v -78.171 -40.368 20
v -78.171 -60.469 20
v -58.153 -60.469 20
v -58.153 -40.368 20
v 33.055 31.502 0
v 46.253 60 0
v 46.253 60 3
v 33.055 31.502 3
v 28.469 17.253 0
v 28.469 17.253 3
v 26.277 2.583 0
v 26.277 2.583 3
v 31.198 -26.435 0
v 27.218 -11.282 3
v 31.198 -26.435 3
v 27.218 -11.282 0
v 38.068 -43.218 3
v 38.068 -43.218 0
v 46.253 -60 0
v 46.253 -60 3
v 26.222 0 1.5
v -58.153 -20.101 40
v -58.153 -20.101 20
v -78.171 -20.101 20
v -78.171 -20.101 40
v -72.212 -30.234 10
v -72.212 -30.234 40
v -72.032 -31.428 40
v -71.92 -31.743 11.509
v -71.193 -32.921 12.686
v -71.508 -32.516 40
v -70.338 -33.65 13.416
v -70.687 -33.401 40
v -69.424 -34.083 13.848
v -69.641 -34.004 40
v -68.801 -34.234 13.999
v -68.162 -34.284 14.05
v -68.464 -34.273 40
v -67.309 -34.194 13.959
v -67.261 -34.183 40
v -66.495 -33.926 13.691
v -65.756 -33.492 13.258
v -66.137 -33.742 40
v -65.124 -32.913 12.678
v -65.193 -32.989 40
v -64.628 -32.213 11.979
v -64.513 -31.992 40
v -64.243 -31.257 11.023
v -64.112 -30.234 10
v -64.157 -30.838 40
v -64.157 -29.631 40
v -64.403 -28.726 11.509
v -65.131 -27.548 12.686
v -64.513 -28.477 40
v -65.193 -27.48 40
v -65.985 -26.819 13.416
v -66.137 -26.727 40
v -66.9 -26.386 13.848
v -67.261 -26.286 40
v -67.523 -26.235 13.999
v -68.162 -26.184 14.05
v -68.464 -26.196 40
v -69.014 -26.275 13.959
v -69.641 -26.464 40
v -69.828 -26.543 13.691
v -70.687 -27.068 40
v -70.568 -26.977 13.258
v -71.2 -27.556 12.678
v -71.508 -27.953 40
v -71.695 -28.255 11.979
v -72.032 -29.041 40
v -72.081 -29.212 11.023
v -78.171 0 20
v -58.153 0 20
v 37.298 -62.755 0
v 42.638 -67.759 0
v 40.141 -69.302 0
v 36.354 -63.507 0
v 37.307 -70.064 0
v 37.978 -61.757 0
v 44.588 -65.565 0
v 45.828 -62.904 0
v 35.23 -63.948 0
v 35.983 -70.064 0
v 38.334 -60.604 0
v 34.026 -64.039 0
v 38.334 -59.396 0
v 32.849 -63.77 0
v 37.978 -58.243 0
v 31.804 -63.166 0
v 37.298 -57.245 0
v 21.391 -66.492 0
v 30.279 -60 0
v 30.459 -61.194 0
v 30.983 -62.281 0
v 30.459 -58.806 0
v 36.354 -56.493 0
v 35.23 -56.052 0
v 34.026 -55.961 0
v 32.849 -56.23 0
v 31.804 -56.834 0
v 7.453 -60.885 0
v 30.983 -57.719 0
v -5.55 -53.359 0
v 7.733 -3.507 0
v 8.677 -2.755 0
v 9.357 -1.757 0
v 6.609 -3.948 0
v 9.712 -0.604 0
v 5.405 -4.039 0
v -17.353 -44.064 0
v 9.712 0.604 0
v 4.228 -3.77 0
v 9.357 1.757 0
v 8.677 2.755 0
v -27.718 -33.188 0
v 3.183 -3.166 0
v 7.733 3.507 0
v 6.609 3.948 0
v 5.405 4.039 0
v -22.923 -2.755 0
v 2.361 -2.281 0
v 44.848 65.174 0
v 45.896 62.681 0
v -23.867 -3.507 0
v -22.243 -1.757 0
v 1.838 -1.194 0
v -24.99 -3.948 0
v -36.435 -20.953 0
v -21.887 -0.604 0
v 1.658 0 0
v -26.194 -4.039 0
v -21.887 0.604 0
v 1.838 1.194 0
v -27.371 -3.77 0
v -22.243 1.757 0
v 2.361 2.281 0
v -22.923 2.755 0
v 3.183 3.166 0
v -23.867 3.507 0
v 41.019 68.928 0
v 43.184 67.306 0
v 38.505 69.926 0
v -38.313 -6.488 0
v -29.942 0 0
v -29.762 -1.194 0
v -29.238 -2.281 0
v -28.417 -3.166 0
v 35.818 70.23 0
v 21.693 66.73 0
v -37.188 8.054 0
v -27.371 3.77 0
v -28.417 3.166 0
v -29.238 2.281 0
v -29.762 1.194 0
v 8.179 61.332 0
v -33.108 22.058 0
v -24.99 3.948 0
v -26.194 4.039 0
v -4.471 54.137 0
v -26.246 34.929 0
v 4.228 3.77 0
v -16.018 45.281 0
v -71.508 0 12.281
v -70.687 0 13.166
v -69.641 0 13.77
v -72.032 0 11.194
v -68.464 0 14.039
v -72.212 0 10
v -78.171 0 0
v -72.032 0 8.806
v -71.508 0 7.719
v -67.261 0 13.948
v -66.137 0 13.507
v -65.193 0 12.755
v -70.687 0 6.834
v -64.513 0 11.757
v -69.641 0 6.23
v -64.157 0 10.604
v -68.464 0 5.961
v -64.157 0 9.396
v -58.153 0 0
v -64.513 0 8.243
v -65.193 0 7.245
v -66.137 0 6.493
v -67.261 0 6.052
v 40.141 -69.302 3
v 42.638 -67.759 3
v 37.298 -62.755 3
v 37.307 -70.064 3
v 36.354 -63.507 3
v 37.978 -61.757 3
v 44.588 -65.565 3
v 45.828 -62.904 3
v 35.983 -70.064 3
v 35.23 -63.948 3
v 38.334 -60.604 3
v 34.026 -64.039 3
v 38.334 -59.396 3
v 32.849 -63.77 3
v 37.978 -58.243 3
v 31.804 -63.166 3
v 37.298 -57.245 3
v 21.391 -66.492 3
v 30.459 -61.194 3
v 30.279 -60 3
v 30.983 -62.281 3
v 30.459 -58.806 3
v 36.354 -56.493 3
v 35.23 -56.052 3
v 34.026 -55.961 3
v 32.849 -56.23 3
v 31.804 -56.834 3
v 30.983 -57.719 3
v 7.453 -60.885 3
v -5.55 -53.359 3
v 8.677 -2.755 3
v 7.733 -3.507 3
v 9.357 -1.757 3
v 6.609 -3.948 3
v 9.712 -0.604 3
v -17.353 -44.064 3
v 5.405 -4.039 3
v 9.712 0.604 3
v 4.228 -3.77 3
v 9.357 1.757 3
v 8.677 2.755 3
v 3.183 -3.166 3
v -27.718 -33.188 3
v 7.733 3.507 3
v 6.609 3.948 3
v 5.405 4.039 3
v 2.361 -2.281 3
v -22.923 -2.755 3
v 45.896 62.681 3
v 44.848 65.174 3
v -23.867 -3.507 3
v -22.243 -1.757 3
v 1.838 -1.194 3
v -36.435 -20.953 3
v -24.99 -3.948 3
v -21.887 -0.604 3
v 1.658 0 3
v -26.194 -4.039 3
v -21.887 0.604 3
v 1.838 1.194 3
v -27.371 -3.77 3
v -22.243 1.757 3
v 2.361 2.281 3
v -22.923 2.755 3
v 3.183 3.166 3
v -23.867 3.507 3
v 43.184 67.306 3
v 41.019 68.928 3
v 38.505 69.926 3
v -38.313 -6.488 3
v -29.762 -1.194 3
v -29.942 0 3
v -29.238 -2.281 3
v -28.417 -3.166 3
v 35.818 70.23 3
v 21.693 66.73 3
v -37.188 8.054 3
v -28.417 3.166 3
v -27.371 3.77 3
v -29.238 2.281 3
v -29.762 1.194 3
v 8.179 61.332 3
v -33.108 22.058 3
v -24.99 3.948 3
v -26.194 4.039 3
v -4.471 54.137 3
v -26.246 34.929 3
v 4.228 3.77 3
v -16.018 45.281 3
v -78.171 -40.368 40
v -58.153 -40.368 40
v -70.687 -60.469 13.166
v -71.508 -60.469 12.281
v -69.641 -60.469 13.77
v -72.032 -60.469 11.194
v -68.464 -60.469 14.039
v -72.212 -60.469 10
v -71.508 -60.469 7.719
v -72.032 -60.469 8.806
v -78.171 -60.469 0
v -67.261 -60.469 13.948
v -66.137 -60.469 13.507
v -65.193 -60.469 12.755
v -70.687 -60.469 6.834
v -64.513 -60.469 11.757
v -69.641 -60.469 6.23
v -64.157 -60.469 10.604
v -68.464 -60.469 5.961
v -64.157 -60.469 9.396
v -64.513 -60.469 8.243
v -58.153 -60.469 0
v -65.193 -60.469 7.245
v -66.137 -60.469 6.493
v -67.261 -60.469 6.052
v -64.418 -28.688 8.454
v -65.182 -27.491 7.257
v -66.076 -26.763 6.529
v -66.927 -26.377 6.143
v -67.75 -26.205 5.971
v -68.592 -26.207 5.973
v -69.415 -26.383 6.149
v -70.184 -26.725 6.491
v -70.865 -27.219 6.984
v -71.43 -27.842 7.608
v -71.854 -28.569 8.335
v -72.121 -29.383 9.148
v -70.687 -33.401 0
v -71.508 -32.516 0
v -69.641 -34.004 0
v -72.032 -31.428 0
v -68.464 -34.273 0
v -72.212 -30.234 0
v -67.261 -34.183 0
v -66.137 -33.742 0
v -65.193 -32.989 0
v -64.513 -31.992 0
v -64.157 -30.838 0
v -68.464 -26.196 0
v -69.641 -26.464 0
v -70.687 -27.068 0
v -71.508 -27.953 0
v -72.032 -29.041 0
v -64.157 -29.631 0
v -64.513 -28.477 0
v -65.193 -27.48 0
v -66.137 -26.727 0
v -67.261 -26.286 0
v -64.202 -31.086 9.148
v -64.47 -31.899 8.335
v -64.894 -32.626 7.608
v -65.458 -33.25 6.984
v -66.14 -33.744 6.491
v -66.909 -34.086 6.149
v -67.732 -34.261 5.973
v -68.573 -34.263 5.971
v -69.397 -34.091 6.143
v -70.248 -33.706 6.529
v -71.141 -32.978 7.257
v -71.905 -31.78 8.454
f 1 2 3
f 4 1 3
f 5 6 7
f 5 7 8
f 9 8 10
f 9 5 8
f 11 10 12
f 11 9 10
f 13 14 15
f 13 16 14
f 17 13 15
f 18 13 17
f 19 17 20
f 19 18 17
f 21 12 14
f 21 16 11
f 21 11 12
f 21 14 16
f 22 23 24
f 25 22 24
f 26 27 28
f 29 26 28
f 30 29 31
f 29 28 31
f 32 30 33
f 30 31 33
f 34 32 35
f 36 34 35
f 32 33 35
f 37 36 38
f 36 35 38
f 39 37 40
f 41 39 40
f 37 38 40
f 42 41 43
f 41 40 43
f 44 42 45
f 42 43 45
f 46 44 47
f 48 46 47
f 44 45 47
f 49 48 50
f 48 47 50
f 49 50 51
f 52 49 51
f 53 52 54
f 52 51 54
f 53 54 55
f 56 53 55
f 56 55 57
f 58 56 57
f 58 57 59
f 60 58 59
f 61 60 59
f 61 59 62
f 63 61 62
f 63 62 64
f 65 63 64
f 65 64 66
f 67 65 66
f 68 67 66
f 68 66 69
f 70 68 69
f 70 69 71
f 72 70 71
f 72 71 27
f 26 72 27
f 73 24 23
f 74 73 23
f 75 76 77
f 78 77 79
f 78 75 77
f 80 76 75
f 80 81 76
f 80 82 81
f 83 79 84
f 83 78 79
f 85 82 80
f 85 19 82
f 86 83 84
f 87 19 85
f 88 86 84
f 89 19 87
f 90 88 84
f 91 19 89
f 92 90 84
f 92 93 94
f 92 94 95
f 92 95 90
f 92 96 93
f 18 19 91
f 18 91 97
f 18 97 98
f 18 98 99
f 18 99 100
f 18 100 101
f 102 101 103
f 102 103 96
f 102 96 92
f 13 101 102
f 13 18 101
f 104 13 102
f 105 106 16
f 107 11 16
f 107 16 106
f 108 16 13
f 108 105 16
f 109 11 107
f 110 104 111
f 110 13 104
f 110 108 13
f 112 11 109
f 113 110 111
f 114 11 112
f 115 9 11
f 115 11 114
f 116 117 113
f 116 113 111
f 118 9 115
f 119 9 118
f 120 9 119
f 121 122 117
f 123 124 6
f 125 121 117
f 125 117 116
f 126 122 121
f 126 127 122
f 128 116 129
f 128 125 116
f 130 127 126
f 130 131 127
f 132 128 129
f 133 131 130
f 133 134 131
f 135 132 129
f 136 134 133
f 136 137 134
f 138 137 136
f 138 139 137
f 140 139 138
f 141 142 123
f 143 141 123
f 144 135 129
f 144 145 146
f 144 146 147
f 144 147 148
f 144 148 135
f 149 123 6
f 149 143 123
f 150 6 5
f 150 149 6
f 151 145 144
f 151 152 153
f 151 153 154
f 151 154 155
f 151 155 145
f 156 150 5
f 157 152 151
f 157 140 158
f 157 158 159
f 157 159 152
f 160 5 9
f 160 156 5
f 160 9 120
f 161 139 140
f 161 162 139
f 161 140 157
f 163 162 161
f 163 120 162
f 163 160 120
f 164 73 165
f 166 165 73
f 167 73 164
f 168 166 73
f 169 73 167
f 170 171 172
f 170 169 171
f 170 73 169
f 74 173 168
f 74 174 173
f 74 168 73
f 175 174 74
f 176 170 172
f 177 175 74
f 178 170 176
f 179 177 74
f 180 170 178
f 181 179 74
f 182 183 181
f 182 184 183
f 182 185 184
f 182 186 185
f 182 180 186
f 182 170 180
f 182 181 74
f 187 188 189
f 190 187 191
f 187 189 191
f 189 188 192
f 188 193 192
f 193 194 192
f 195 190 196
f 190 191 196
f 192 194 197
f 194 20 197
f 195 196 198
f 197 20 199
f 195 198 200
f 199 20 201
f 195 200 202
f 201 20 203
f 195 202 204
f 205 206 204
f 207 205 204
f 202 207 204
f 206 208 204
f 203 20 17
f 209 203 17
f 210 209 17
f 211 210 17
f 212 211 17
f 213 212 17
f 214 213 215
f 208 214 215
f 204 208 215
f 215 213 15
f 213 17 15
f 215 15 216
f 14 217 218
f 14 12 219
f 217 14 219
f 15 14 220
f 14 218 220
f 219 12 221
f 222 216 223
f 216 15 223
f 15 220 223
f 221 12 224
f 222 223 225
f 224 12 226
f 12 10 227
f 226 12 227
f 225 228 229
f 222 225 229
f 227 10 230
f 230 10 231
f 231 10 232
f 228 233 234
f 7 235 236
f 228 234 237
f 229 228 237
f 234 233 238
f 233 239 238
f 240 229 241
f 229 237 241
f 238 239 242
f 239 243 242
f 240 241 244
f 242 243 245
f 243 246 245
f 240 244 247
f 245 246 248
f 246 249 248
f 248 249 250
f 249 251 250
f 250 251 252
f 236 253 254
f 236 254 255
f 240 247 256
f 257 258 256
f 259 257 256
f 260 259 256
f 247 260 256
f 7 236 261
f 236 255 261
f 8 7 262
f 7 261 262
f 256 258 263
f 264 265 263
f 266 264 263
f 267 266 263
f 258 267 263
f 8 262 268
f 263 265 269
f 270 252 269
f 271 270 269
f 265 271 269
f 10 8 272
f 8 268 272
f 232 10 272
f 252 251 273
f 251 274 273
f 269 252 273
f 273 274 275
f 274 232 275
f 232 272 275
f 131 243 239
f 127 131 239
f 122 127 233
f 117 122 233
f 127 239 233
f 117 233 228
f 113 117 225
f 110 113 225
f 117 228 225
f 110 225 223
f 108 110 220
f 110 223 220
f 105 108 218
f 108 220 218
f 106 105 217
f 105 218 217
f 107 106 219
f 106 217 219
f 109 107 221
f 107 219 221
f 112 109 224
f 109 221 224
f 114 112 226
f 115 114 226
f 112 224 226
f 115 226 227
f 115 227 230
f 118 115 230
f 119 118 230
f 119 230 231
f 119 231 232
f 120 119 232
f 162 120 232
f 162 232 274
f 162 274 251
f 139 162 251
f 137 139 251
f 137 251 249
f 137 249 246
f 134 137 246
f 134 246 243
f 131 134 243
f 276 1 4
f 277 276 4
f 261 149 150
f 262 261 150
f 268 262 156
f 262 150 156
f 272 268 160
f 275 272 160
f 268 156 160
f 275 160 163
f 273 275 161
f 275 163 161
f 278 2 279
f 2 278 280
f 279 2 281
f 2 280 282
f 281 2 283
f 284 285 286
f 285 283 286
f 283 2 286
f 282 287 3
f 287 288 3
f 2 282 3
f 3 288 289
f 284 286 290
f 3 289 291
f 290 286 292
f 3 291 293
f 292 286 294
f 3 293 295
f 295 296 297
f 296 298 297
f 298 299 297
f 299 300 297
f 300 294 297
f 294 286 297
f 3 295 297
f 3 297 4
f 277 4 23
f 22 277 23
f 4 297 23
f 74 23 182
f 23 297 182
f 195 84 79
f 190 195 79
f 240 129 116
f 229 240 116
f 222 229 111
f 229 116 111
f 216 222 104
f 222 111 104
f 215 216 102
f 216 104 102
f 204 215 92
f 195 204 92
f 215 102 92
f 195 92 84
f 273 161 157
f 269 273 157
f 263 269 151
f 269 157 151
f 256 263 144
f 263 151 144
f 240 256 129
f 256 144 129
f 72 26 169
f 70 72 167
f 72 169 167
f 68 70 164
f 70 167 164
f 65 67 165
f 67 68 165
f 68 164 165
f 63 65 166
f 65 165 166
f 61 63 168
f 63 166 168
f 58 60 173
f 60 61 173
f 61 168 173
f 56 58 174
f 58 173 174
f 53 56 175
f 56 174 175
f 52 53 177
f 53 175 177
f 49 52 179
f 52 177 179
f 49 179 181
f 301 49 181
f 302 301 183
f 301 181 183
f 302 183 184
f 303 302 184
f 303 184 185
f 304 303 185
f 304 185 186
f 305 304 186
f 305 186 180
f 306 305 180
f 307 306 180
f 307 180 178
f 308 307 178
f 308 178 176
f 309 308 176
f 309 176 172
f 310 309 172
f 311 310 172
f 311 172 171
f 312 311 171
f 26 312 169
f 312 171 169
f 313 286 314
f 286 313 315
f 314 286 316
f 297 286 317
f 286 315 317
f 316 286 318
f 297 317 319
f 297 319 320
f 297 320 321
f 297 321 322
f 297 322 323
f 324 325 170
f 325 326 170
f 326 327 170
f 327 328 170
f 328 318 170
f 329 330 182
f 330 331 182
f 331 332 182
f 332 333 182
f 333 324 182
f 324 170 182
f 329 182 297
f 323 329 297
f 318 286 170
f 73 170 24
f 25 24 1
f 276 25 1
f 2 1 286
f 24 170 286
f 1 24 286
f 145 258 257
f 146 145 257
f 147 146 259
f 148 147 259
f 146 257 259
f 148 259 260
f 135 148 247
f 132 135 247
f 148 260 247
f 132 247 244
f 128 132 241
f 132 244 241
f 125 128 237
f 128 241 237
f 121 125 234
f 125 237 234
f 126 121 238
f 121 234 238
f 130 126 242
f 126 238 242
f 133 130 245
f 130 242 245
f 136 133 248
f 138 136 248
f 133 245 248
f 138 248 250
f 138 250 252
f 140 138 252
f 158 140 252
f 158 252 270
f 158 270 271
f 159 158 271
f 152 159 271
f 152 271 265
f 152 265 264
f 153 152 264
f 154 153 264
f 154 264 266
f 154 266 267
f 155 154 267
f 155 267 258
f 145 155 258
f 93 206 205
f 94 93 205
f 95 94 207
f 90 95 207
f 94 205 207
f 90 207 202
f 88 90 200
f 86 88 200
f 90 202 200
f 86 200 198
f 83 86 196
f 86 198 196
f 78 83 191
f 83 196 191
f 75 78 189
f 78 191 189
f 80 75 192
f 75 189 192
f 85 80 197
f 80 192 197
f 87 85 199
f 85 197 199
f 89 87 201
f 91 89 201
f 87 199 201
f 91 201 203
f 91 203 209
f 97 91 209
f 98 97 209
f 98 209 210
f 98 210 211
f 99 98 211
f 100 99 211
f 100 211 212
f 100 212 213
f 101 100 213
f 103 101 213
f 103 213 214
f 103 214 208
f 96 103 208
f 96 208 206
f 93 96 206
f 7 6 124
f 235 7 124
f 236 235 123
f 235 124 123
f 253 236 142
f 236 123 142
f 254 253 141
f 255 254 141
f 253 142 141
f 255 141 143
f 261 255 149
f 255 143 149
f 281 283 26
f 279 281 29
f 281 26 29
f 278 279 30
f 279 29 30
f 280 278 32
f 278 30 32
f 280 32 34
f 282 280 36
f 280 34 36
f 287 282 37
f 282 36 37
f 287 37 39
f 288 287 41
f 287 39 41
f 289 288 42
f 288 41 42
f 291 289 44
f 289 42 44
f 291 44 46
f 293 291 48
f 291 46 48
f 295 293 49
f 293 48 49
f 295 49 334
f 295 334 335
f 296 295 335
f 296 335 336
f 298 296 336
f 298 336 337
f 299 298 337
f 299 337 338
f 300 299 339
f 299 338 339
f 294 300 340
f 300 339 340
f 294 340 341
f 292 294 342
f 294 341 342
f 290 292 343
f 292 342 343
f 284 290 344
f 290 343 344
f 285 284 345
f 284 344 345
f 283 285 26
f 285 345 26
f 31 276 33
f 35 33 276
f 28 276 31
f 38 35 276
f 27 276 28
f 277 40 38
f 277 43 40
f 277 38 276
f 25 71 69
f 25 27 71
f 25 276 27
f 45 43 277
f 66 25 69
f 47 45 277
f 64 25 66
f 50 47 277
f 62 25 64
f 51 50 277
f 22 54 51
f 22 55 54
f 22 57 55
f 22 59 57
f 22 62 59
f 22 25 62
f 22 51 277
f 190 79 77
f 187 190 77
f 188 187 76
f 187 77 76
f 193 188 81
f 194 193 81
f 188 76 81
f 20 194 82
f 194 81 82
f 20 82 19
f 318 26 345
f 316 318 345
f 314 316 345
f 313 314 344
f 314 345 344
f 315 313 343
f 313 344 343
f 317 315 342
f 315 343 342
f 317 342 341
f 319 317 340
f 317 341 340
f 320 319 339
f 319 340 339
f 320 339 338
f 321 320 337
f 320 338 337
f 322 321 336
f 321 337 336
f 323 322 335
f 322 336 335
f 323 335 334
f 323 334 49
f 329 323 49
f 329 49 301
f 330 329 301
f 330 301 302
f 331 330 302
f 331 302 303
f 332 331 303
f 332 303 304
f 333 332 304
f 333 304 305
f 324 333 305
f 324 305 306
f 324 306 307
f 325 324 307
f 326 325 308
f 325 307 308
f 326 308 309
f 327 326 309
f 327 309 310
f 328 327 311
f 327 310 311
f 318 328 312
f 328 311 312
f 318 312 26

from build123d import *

# Parameters (mm, degrees)
F1_DEPTH = 3
F2_D     = 8.1
F0_W     = 20.01837641
F0_H     = 20.1011039317
F3_DEPTH = 20
F4_DEPTH = 40
F5_D     = 8.1
F7_D     = 8.1


with BuildPart() as f1:
    # F0 (on Top) → F1 (new body)
    with BuildSketch(Plane.XY):
        with BuildLine():
            add(Edge.make_bspline(
                [(46.252983409, 60), (36.237705858, 40), (16.2071507559, 0), (36.237705858, -40), (46.252983409, -60)],
                knots=[0, 0, 0, 0, 0.5, 1, 1, 1, 1], degree=3))
            ThreePointArc((46.252983409, 60), (43.1839686648, 67.3064522221), (35.8180180192, 70.2297836542))
            ThreePointArc((35.8180180192, 70.2297836542), (1.7306915698, 57.9512319162), (-26.2458395153, 34.9290173028))
            ThreePointArc((-26.2458395153, 34.9290173028), (-37.1883000354, 8.0543397848), (-36.4354990583, -20.9528838779))
            ThreePointArc((-36.4354990583, -20.9528838779), (-5.5495112653, -53.3585464112), (35.9834581614, -70.0643435121))
            Line((35.9834581614, -70.0643435121), (37.3069904745, -70.0643435121))
            ThreePointArc((37.3069904745, -70.0643435121), (43.6932008175, -66.7327891678), (46.252983409, -60))
        make_face()
    extrude(amount=F1_DEPTH)

    # F2 (through all)
    with Locations(Plane(origin=(0, 0, 0), x_dir=(1, 0, 0), z_dir=(0, 0, -1))):
        with Locations((34.3290492892, 60), (5.7077207603, 0), (-25.8915442973, 0)):
            Hole(F2_D / 2)


with BuildPart() as f3:
    # F0 (on Top) → F3 (new body)
    with BuildSketch(Plane.XY):
        with Locations((-68.1617669761, -10.0505519658)):
            Rectangle(F0_W, F0_H)
        Polygon((-58.1525787711, -30.2343759686), (-58.1525787711, -20.1011039317), (-78.1709551811, -20.1011039317), (-78.1709551811, -30.2343759686), (-78.1709551811, -40.3676480055), (-58.1525787711, -40.3676480055), align=None)
        with Locations((-68.1617669761, -50.4181999713)):
            Rectangle(F0_W, F0_H)
    extrude(amount=F3_DEPTH)

    # F0 (on Top) → F4 (join)
    with BuildSketch(Plane.XY):
        Polygon((-58.1525787711, -30.2343759686), (-58.1525787711, -20.1011039317), (-78.1709551811, -20.1011039317), (-78.1709551811, -30.2343759686), (-78.1709551811, -40.3676480055), (-58.1525787711, -40.3676480055), align=None)
    extrude(amount=F4_DEPTH)

    # F5 (through all)
    with Locations(Plane(origin=(0, 0, 0), x_dir=(1, 0, 0), z_dir=(0, 0, -1))):
        with Locations((-68.1617669761, 30.2343759686)):
            Hole(F5_D / 2)

    # F7 (through all)
    with Locations(Plane.XZ.offset(60.4687519372)):
        with Locations((-68.1617669761, 10)):
            Hole(F7_D / 2)


solid = Compound([f1.part, f3.part])
